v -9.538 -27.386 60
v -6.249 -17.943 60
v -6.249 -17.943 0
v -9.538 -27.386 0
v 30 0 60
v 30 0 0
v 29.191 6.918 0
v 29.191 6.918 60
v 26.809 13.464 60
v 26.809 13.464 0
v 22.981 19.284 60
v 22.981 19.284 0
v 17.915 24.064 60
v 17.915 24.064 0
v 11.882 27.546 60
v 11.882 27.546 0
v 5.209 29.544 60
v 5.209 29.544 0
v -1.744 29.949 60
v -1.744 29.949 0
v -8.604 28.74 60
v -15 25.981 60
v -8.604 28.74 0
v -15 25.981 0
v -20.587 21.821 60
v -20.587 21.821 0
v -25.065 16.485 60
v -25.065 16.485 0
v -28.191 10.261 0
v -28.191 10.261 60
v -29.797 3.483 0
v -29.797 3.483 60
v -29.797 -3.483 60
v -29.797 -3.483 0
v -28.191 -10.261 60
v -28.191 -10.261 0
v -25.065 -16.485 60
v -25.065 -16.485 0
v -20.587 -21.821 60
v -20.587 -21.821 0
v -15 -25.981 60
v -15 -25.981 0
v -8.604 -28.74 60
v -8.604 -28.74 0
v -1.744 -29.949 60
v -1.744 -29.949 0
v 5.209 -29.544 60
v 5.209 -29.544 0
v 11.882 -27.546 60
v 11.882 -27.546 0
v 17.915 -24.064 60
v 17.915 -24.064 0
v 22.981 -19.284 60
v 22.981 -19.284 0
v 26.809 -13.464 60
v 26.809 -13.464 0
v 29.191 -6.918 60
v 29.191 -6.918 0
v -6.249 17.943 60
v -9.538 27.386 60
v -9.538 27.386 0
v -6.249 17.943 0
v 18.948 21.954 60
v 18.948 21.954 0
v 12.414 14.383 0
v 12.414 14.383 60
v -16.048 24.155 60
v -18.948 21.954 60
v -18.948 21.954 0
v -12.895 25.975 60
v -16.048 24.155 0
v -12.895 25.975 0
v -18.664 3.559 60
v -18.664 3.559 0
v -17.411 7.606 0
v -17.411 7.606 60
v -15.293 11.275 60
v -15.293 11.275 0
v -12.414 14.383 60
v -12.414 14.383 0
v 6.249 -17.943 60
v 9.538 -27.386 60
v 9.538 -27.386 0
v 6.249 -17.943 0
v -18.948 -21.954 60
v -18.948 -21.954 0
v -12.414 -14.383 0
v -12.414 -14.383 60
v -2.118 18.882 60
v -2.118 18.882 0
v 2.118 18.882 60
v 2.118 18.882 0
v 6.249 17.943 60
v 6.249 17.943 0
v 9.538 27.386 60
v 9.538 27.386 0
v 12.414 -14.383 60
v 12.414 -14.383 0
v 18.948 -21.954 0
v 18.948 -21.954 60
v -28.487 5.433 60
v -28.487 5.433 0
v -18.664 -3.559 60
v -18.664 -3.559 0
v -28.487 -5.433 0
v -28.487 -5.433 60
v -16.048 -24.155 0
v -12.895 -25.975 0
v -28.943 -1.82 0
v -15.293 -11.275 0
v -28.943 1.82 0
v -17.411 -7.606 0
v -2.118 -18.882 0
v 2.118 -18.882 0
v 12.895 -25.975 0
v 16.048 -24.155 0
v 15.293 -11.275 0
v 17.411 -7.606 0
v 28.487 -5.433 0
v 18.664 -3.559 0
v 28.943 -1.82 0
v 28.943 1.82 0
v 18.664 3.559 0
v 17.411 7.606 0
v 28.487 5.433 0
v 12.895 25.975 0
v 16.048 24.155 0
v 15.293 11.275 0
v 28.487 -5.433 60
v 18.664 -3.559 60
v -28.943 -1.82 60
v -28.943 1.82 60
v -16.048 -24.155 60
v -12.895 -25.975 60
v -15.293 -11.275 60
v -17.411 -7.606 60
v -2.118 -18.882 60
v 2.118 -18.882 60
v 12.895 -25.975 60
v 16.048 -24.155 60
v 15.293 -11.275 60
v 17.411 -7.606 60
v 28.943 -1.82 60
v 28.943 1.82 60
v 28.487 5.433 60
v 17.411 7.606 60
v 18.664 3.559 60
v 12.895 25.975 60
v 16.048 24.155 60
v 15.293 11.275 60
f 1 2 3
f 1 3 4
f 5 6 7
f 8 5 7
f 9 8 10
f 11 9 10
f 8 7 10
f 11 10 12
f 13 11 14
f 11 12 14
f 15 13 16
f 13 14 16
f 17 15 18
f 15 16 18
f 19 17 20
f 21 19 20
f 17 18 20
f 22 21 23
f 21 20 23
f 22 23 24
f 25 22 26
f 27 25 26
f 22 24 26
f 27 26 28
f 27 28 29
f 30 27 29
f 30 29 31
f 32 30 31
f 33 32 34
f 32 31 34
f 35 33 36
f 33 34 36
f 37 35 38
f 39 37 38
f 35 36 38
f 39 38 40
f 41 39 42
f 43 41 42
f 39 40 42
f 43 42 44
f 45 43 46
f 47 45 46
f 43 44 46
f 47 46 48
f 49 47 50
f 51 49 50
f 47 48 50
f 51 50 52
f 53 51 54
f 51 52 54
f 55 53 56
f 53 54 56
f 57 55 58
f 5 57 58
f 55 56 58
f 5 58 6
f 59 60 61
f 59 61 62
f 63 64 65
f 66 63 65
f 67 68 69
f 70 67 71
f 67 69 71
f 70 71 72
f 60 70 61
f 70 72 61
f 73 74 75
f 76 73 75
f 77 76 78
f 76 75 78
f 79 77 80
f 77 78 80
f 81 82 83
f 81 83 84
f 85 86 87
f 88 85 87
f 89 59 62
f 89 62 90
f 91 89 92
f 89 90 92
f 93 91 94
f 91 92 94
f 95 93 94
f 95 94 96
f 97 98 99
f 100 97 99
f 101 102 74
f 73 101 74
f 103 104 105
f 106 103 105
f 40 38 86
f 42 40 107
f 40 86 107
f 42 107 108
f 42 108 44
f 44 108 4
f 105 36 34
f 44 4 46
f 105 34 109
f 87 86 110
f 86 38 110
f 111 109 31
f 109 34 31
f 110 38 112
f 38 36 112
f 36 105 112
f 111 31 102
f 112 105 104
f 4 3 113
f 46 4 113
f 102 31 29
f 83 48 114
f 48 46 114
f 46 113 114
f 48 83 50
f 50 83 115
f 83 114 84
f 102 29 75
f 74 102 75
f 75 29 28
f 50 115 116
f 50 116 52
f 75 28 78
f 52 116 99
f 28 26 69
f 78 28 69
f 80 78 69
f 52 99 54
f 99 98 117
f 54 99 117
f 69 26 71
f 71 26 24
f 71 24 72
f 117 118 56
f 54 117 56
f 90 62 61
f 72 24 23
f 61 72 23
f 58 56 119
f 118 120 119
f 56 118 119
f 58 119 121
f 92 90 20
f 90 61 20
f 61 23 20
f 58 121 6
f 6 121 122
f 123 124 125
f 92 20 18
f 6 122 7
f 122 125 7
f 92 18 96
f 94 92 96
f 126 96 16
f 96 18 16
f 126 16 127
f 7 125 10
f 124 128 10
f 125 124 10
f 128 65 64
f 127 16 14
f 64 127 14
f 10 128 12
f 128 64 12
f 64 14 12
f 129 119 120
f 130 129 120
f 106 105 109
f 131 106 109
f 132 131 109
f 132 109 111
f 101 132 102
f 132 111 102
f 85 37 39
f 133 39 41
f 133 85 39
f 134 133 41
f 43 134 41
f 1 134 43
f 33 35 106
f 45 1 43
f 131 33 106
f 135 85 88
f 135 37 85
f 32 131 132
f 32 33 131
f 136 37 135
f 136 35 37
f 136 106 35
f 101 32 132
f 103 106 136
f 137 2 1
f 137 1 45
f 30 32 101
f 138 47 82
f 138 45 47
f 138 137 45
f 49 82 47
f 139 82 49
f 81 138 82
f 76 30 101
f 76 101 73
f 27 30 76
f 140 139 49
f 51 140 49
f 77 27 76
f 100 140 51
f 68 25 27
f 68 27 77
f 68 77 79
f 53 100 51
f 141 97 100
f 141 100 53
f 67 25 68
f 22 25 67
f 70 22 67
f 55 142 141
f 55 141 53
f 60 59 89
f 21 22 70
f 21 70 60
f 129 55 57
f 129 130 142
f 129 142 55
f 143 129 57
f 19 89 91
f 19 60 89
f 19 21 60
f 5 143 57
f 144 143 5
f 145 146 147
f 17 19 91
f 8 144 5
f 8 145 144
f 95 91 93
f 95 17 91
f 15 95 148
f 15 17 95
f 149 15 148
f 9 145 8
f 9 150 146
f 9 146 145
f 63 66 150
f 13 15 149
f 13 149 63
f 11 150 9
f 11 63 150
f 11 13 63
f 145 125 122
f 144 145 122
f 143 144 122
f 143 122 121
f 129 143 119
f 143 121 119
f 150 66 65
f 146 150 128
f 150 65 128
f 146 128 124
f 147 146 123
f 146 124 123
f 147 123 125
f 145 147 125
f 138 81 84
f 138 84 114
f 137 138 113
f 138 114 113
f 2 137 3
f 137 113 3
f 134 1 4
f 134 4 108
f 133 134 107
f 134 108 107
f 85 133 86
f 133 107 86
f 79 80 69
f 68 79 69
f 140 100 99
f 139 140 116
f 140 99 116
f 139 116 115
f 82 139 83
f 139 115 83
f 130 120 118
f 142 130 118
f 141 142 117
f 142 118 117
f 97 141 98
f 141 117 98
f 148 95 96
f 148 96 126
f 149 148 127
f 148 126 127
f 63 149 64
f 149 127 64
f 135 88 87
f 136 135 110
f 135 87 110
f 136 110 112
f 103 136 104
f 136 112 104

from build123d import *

# Parameters (mm, degrees)
SKETCH4_R           = 30
BOSS_EXTRUDE2_DEPTH = 60
CUT_EXTRUDE1_DEPTH  = 74.484692283


with BuildPart() as part:
    # Sketch4 → Boss-Extrude2 (new body)
    with BuildSketch(Plane.XY):
        Circle(SKETCH4_R)
    extrude(amount=BOSS_EXTRUDE2_DEPTH)

    # Sketch5 → Cut-Extrude1 (cut, through all)
    with BuildSketch(Plane(origin=(0, 0, 0), x_dir=(-1, 0, 0), z_dir=(0, 0, -1))):
        with BuildLine():
            Line((-6.249262611, 17.942873706), (-9.538348196, 27.386491445))
            ThreePointArc((-9.538348196, 27.386491445), (-14.5, 25.11473671), (-18.948223214, 21.953697571))
            Line((-18.948223214, 21.953697571), (-12.41435314, 14.383457029))
            ThreePointArc((-12.41435314, 14.383457029), (-16.454482672, 9.5), (-18.663615752, 3.559416677))
            Line((-18.663615752, 3.559416677), (-28.48657141, 5.432793875))
            ThreePointArc((-28.48657141, 5.432793875), (-29, 0), (-28.48657141, -5.432793875))
            Line((-28.48657141, -5.432793875), (-18.663615752, -3.559416677))
            ThreePointArc((-18.663615752, -3.559416677), (-16.454482672, -9.5), (-12.41435314, -14.383457029))
            Line((-12.41435314, -14.383457029), (-18.948223214, -21.953697571))
            ThreePointArc((-18.948223214, -21.953697571), (-14.5, -25.11473671), (-9.538348196, -27.386491445))
            Line((-9.538348196, -27.386491445), (-6.249262611, -17.942873706))
            ThreePointArc((-6.249262611, -17.942873706), (0, -19), (6.249262611, -17.942873706))
            Line((6.249262611, -17.942873706), (9.538348196, -27.386491445))
            ThreePointArc((9.538348196, -27.386491445), (14.5, -25.11473671), (18.948223214, -21.953697571))
            Line((18.948223214, -21.953697571), (12.41435314, -14.383457029))
            ThreePointArc((12.41435314, -14.383457029), (16.454482672, -9.5), (18.663615752, -3.559416677))
            Line((18.663615752, -3.559416677), (28.48657141, -5.432793875))
            ThreePointArc((28.48657141, -5.432793875), (29, 0), (28.48657141, 5.432793875))
            Line((28.48657141, 5.432793875), (18.663615752, 3.559416677))
            ThreePointArc((18.663615752, 3.559416677), (16.454482672, 9.5), (12.41435314, 14.383457029))
            Line((12.41435314, 14.383457029), (18.948223214, 21.953697571))
            ThreePointArc((18.948223214, 21.953697571), (14.5, 25.11473671), (9.538348196, 27.386491445))
            Line((9.538348196, 27.386491445), (6.249262611, 17.942873706))
            ThreePointArc((6.249262611, 17.942873706), (0, 19), (-6.249262611, 17.942873706))
        make_face()
    extrude(amount=-CUT_EXTRUDE1_DEPTH, mode=Mode.SUBTRACT)


solid = part.part
